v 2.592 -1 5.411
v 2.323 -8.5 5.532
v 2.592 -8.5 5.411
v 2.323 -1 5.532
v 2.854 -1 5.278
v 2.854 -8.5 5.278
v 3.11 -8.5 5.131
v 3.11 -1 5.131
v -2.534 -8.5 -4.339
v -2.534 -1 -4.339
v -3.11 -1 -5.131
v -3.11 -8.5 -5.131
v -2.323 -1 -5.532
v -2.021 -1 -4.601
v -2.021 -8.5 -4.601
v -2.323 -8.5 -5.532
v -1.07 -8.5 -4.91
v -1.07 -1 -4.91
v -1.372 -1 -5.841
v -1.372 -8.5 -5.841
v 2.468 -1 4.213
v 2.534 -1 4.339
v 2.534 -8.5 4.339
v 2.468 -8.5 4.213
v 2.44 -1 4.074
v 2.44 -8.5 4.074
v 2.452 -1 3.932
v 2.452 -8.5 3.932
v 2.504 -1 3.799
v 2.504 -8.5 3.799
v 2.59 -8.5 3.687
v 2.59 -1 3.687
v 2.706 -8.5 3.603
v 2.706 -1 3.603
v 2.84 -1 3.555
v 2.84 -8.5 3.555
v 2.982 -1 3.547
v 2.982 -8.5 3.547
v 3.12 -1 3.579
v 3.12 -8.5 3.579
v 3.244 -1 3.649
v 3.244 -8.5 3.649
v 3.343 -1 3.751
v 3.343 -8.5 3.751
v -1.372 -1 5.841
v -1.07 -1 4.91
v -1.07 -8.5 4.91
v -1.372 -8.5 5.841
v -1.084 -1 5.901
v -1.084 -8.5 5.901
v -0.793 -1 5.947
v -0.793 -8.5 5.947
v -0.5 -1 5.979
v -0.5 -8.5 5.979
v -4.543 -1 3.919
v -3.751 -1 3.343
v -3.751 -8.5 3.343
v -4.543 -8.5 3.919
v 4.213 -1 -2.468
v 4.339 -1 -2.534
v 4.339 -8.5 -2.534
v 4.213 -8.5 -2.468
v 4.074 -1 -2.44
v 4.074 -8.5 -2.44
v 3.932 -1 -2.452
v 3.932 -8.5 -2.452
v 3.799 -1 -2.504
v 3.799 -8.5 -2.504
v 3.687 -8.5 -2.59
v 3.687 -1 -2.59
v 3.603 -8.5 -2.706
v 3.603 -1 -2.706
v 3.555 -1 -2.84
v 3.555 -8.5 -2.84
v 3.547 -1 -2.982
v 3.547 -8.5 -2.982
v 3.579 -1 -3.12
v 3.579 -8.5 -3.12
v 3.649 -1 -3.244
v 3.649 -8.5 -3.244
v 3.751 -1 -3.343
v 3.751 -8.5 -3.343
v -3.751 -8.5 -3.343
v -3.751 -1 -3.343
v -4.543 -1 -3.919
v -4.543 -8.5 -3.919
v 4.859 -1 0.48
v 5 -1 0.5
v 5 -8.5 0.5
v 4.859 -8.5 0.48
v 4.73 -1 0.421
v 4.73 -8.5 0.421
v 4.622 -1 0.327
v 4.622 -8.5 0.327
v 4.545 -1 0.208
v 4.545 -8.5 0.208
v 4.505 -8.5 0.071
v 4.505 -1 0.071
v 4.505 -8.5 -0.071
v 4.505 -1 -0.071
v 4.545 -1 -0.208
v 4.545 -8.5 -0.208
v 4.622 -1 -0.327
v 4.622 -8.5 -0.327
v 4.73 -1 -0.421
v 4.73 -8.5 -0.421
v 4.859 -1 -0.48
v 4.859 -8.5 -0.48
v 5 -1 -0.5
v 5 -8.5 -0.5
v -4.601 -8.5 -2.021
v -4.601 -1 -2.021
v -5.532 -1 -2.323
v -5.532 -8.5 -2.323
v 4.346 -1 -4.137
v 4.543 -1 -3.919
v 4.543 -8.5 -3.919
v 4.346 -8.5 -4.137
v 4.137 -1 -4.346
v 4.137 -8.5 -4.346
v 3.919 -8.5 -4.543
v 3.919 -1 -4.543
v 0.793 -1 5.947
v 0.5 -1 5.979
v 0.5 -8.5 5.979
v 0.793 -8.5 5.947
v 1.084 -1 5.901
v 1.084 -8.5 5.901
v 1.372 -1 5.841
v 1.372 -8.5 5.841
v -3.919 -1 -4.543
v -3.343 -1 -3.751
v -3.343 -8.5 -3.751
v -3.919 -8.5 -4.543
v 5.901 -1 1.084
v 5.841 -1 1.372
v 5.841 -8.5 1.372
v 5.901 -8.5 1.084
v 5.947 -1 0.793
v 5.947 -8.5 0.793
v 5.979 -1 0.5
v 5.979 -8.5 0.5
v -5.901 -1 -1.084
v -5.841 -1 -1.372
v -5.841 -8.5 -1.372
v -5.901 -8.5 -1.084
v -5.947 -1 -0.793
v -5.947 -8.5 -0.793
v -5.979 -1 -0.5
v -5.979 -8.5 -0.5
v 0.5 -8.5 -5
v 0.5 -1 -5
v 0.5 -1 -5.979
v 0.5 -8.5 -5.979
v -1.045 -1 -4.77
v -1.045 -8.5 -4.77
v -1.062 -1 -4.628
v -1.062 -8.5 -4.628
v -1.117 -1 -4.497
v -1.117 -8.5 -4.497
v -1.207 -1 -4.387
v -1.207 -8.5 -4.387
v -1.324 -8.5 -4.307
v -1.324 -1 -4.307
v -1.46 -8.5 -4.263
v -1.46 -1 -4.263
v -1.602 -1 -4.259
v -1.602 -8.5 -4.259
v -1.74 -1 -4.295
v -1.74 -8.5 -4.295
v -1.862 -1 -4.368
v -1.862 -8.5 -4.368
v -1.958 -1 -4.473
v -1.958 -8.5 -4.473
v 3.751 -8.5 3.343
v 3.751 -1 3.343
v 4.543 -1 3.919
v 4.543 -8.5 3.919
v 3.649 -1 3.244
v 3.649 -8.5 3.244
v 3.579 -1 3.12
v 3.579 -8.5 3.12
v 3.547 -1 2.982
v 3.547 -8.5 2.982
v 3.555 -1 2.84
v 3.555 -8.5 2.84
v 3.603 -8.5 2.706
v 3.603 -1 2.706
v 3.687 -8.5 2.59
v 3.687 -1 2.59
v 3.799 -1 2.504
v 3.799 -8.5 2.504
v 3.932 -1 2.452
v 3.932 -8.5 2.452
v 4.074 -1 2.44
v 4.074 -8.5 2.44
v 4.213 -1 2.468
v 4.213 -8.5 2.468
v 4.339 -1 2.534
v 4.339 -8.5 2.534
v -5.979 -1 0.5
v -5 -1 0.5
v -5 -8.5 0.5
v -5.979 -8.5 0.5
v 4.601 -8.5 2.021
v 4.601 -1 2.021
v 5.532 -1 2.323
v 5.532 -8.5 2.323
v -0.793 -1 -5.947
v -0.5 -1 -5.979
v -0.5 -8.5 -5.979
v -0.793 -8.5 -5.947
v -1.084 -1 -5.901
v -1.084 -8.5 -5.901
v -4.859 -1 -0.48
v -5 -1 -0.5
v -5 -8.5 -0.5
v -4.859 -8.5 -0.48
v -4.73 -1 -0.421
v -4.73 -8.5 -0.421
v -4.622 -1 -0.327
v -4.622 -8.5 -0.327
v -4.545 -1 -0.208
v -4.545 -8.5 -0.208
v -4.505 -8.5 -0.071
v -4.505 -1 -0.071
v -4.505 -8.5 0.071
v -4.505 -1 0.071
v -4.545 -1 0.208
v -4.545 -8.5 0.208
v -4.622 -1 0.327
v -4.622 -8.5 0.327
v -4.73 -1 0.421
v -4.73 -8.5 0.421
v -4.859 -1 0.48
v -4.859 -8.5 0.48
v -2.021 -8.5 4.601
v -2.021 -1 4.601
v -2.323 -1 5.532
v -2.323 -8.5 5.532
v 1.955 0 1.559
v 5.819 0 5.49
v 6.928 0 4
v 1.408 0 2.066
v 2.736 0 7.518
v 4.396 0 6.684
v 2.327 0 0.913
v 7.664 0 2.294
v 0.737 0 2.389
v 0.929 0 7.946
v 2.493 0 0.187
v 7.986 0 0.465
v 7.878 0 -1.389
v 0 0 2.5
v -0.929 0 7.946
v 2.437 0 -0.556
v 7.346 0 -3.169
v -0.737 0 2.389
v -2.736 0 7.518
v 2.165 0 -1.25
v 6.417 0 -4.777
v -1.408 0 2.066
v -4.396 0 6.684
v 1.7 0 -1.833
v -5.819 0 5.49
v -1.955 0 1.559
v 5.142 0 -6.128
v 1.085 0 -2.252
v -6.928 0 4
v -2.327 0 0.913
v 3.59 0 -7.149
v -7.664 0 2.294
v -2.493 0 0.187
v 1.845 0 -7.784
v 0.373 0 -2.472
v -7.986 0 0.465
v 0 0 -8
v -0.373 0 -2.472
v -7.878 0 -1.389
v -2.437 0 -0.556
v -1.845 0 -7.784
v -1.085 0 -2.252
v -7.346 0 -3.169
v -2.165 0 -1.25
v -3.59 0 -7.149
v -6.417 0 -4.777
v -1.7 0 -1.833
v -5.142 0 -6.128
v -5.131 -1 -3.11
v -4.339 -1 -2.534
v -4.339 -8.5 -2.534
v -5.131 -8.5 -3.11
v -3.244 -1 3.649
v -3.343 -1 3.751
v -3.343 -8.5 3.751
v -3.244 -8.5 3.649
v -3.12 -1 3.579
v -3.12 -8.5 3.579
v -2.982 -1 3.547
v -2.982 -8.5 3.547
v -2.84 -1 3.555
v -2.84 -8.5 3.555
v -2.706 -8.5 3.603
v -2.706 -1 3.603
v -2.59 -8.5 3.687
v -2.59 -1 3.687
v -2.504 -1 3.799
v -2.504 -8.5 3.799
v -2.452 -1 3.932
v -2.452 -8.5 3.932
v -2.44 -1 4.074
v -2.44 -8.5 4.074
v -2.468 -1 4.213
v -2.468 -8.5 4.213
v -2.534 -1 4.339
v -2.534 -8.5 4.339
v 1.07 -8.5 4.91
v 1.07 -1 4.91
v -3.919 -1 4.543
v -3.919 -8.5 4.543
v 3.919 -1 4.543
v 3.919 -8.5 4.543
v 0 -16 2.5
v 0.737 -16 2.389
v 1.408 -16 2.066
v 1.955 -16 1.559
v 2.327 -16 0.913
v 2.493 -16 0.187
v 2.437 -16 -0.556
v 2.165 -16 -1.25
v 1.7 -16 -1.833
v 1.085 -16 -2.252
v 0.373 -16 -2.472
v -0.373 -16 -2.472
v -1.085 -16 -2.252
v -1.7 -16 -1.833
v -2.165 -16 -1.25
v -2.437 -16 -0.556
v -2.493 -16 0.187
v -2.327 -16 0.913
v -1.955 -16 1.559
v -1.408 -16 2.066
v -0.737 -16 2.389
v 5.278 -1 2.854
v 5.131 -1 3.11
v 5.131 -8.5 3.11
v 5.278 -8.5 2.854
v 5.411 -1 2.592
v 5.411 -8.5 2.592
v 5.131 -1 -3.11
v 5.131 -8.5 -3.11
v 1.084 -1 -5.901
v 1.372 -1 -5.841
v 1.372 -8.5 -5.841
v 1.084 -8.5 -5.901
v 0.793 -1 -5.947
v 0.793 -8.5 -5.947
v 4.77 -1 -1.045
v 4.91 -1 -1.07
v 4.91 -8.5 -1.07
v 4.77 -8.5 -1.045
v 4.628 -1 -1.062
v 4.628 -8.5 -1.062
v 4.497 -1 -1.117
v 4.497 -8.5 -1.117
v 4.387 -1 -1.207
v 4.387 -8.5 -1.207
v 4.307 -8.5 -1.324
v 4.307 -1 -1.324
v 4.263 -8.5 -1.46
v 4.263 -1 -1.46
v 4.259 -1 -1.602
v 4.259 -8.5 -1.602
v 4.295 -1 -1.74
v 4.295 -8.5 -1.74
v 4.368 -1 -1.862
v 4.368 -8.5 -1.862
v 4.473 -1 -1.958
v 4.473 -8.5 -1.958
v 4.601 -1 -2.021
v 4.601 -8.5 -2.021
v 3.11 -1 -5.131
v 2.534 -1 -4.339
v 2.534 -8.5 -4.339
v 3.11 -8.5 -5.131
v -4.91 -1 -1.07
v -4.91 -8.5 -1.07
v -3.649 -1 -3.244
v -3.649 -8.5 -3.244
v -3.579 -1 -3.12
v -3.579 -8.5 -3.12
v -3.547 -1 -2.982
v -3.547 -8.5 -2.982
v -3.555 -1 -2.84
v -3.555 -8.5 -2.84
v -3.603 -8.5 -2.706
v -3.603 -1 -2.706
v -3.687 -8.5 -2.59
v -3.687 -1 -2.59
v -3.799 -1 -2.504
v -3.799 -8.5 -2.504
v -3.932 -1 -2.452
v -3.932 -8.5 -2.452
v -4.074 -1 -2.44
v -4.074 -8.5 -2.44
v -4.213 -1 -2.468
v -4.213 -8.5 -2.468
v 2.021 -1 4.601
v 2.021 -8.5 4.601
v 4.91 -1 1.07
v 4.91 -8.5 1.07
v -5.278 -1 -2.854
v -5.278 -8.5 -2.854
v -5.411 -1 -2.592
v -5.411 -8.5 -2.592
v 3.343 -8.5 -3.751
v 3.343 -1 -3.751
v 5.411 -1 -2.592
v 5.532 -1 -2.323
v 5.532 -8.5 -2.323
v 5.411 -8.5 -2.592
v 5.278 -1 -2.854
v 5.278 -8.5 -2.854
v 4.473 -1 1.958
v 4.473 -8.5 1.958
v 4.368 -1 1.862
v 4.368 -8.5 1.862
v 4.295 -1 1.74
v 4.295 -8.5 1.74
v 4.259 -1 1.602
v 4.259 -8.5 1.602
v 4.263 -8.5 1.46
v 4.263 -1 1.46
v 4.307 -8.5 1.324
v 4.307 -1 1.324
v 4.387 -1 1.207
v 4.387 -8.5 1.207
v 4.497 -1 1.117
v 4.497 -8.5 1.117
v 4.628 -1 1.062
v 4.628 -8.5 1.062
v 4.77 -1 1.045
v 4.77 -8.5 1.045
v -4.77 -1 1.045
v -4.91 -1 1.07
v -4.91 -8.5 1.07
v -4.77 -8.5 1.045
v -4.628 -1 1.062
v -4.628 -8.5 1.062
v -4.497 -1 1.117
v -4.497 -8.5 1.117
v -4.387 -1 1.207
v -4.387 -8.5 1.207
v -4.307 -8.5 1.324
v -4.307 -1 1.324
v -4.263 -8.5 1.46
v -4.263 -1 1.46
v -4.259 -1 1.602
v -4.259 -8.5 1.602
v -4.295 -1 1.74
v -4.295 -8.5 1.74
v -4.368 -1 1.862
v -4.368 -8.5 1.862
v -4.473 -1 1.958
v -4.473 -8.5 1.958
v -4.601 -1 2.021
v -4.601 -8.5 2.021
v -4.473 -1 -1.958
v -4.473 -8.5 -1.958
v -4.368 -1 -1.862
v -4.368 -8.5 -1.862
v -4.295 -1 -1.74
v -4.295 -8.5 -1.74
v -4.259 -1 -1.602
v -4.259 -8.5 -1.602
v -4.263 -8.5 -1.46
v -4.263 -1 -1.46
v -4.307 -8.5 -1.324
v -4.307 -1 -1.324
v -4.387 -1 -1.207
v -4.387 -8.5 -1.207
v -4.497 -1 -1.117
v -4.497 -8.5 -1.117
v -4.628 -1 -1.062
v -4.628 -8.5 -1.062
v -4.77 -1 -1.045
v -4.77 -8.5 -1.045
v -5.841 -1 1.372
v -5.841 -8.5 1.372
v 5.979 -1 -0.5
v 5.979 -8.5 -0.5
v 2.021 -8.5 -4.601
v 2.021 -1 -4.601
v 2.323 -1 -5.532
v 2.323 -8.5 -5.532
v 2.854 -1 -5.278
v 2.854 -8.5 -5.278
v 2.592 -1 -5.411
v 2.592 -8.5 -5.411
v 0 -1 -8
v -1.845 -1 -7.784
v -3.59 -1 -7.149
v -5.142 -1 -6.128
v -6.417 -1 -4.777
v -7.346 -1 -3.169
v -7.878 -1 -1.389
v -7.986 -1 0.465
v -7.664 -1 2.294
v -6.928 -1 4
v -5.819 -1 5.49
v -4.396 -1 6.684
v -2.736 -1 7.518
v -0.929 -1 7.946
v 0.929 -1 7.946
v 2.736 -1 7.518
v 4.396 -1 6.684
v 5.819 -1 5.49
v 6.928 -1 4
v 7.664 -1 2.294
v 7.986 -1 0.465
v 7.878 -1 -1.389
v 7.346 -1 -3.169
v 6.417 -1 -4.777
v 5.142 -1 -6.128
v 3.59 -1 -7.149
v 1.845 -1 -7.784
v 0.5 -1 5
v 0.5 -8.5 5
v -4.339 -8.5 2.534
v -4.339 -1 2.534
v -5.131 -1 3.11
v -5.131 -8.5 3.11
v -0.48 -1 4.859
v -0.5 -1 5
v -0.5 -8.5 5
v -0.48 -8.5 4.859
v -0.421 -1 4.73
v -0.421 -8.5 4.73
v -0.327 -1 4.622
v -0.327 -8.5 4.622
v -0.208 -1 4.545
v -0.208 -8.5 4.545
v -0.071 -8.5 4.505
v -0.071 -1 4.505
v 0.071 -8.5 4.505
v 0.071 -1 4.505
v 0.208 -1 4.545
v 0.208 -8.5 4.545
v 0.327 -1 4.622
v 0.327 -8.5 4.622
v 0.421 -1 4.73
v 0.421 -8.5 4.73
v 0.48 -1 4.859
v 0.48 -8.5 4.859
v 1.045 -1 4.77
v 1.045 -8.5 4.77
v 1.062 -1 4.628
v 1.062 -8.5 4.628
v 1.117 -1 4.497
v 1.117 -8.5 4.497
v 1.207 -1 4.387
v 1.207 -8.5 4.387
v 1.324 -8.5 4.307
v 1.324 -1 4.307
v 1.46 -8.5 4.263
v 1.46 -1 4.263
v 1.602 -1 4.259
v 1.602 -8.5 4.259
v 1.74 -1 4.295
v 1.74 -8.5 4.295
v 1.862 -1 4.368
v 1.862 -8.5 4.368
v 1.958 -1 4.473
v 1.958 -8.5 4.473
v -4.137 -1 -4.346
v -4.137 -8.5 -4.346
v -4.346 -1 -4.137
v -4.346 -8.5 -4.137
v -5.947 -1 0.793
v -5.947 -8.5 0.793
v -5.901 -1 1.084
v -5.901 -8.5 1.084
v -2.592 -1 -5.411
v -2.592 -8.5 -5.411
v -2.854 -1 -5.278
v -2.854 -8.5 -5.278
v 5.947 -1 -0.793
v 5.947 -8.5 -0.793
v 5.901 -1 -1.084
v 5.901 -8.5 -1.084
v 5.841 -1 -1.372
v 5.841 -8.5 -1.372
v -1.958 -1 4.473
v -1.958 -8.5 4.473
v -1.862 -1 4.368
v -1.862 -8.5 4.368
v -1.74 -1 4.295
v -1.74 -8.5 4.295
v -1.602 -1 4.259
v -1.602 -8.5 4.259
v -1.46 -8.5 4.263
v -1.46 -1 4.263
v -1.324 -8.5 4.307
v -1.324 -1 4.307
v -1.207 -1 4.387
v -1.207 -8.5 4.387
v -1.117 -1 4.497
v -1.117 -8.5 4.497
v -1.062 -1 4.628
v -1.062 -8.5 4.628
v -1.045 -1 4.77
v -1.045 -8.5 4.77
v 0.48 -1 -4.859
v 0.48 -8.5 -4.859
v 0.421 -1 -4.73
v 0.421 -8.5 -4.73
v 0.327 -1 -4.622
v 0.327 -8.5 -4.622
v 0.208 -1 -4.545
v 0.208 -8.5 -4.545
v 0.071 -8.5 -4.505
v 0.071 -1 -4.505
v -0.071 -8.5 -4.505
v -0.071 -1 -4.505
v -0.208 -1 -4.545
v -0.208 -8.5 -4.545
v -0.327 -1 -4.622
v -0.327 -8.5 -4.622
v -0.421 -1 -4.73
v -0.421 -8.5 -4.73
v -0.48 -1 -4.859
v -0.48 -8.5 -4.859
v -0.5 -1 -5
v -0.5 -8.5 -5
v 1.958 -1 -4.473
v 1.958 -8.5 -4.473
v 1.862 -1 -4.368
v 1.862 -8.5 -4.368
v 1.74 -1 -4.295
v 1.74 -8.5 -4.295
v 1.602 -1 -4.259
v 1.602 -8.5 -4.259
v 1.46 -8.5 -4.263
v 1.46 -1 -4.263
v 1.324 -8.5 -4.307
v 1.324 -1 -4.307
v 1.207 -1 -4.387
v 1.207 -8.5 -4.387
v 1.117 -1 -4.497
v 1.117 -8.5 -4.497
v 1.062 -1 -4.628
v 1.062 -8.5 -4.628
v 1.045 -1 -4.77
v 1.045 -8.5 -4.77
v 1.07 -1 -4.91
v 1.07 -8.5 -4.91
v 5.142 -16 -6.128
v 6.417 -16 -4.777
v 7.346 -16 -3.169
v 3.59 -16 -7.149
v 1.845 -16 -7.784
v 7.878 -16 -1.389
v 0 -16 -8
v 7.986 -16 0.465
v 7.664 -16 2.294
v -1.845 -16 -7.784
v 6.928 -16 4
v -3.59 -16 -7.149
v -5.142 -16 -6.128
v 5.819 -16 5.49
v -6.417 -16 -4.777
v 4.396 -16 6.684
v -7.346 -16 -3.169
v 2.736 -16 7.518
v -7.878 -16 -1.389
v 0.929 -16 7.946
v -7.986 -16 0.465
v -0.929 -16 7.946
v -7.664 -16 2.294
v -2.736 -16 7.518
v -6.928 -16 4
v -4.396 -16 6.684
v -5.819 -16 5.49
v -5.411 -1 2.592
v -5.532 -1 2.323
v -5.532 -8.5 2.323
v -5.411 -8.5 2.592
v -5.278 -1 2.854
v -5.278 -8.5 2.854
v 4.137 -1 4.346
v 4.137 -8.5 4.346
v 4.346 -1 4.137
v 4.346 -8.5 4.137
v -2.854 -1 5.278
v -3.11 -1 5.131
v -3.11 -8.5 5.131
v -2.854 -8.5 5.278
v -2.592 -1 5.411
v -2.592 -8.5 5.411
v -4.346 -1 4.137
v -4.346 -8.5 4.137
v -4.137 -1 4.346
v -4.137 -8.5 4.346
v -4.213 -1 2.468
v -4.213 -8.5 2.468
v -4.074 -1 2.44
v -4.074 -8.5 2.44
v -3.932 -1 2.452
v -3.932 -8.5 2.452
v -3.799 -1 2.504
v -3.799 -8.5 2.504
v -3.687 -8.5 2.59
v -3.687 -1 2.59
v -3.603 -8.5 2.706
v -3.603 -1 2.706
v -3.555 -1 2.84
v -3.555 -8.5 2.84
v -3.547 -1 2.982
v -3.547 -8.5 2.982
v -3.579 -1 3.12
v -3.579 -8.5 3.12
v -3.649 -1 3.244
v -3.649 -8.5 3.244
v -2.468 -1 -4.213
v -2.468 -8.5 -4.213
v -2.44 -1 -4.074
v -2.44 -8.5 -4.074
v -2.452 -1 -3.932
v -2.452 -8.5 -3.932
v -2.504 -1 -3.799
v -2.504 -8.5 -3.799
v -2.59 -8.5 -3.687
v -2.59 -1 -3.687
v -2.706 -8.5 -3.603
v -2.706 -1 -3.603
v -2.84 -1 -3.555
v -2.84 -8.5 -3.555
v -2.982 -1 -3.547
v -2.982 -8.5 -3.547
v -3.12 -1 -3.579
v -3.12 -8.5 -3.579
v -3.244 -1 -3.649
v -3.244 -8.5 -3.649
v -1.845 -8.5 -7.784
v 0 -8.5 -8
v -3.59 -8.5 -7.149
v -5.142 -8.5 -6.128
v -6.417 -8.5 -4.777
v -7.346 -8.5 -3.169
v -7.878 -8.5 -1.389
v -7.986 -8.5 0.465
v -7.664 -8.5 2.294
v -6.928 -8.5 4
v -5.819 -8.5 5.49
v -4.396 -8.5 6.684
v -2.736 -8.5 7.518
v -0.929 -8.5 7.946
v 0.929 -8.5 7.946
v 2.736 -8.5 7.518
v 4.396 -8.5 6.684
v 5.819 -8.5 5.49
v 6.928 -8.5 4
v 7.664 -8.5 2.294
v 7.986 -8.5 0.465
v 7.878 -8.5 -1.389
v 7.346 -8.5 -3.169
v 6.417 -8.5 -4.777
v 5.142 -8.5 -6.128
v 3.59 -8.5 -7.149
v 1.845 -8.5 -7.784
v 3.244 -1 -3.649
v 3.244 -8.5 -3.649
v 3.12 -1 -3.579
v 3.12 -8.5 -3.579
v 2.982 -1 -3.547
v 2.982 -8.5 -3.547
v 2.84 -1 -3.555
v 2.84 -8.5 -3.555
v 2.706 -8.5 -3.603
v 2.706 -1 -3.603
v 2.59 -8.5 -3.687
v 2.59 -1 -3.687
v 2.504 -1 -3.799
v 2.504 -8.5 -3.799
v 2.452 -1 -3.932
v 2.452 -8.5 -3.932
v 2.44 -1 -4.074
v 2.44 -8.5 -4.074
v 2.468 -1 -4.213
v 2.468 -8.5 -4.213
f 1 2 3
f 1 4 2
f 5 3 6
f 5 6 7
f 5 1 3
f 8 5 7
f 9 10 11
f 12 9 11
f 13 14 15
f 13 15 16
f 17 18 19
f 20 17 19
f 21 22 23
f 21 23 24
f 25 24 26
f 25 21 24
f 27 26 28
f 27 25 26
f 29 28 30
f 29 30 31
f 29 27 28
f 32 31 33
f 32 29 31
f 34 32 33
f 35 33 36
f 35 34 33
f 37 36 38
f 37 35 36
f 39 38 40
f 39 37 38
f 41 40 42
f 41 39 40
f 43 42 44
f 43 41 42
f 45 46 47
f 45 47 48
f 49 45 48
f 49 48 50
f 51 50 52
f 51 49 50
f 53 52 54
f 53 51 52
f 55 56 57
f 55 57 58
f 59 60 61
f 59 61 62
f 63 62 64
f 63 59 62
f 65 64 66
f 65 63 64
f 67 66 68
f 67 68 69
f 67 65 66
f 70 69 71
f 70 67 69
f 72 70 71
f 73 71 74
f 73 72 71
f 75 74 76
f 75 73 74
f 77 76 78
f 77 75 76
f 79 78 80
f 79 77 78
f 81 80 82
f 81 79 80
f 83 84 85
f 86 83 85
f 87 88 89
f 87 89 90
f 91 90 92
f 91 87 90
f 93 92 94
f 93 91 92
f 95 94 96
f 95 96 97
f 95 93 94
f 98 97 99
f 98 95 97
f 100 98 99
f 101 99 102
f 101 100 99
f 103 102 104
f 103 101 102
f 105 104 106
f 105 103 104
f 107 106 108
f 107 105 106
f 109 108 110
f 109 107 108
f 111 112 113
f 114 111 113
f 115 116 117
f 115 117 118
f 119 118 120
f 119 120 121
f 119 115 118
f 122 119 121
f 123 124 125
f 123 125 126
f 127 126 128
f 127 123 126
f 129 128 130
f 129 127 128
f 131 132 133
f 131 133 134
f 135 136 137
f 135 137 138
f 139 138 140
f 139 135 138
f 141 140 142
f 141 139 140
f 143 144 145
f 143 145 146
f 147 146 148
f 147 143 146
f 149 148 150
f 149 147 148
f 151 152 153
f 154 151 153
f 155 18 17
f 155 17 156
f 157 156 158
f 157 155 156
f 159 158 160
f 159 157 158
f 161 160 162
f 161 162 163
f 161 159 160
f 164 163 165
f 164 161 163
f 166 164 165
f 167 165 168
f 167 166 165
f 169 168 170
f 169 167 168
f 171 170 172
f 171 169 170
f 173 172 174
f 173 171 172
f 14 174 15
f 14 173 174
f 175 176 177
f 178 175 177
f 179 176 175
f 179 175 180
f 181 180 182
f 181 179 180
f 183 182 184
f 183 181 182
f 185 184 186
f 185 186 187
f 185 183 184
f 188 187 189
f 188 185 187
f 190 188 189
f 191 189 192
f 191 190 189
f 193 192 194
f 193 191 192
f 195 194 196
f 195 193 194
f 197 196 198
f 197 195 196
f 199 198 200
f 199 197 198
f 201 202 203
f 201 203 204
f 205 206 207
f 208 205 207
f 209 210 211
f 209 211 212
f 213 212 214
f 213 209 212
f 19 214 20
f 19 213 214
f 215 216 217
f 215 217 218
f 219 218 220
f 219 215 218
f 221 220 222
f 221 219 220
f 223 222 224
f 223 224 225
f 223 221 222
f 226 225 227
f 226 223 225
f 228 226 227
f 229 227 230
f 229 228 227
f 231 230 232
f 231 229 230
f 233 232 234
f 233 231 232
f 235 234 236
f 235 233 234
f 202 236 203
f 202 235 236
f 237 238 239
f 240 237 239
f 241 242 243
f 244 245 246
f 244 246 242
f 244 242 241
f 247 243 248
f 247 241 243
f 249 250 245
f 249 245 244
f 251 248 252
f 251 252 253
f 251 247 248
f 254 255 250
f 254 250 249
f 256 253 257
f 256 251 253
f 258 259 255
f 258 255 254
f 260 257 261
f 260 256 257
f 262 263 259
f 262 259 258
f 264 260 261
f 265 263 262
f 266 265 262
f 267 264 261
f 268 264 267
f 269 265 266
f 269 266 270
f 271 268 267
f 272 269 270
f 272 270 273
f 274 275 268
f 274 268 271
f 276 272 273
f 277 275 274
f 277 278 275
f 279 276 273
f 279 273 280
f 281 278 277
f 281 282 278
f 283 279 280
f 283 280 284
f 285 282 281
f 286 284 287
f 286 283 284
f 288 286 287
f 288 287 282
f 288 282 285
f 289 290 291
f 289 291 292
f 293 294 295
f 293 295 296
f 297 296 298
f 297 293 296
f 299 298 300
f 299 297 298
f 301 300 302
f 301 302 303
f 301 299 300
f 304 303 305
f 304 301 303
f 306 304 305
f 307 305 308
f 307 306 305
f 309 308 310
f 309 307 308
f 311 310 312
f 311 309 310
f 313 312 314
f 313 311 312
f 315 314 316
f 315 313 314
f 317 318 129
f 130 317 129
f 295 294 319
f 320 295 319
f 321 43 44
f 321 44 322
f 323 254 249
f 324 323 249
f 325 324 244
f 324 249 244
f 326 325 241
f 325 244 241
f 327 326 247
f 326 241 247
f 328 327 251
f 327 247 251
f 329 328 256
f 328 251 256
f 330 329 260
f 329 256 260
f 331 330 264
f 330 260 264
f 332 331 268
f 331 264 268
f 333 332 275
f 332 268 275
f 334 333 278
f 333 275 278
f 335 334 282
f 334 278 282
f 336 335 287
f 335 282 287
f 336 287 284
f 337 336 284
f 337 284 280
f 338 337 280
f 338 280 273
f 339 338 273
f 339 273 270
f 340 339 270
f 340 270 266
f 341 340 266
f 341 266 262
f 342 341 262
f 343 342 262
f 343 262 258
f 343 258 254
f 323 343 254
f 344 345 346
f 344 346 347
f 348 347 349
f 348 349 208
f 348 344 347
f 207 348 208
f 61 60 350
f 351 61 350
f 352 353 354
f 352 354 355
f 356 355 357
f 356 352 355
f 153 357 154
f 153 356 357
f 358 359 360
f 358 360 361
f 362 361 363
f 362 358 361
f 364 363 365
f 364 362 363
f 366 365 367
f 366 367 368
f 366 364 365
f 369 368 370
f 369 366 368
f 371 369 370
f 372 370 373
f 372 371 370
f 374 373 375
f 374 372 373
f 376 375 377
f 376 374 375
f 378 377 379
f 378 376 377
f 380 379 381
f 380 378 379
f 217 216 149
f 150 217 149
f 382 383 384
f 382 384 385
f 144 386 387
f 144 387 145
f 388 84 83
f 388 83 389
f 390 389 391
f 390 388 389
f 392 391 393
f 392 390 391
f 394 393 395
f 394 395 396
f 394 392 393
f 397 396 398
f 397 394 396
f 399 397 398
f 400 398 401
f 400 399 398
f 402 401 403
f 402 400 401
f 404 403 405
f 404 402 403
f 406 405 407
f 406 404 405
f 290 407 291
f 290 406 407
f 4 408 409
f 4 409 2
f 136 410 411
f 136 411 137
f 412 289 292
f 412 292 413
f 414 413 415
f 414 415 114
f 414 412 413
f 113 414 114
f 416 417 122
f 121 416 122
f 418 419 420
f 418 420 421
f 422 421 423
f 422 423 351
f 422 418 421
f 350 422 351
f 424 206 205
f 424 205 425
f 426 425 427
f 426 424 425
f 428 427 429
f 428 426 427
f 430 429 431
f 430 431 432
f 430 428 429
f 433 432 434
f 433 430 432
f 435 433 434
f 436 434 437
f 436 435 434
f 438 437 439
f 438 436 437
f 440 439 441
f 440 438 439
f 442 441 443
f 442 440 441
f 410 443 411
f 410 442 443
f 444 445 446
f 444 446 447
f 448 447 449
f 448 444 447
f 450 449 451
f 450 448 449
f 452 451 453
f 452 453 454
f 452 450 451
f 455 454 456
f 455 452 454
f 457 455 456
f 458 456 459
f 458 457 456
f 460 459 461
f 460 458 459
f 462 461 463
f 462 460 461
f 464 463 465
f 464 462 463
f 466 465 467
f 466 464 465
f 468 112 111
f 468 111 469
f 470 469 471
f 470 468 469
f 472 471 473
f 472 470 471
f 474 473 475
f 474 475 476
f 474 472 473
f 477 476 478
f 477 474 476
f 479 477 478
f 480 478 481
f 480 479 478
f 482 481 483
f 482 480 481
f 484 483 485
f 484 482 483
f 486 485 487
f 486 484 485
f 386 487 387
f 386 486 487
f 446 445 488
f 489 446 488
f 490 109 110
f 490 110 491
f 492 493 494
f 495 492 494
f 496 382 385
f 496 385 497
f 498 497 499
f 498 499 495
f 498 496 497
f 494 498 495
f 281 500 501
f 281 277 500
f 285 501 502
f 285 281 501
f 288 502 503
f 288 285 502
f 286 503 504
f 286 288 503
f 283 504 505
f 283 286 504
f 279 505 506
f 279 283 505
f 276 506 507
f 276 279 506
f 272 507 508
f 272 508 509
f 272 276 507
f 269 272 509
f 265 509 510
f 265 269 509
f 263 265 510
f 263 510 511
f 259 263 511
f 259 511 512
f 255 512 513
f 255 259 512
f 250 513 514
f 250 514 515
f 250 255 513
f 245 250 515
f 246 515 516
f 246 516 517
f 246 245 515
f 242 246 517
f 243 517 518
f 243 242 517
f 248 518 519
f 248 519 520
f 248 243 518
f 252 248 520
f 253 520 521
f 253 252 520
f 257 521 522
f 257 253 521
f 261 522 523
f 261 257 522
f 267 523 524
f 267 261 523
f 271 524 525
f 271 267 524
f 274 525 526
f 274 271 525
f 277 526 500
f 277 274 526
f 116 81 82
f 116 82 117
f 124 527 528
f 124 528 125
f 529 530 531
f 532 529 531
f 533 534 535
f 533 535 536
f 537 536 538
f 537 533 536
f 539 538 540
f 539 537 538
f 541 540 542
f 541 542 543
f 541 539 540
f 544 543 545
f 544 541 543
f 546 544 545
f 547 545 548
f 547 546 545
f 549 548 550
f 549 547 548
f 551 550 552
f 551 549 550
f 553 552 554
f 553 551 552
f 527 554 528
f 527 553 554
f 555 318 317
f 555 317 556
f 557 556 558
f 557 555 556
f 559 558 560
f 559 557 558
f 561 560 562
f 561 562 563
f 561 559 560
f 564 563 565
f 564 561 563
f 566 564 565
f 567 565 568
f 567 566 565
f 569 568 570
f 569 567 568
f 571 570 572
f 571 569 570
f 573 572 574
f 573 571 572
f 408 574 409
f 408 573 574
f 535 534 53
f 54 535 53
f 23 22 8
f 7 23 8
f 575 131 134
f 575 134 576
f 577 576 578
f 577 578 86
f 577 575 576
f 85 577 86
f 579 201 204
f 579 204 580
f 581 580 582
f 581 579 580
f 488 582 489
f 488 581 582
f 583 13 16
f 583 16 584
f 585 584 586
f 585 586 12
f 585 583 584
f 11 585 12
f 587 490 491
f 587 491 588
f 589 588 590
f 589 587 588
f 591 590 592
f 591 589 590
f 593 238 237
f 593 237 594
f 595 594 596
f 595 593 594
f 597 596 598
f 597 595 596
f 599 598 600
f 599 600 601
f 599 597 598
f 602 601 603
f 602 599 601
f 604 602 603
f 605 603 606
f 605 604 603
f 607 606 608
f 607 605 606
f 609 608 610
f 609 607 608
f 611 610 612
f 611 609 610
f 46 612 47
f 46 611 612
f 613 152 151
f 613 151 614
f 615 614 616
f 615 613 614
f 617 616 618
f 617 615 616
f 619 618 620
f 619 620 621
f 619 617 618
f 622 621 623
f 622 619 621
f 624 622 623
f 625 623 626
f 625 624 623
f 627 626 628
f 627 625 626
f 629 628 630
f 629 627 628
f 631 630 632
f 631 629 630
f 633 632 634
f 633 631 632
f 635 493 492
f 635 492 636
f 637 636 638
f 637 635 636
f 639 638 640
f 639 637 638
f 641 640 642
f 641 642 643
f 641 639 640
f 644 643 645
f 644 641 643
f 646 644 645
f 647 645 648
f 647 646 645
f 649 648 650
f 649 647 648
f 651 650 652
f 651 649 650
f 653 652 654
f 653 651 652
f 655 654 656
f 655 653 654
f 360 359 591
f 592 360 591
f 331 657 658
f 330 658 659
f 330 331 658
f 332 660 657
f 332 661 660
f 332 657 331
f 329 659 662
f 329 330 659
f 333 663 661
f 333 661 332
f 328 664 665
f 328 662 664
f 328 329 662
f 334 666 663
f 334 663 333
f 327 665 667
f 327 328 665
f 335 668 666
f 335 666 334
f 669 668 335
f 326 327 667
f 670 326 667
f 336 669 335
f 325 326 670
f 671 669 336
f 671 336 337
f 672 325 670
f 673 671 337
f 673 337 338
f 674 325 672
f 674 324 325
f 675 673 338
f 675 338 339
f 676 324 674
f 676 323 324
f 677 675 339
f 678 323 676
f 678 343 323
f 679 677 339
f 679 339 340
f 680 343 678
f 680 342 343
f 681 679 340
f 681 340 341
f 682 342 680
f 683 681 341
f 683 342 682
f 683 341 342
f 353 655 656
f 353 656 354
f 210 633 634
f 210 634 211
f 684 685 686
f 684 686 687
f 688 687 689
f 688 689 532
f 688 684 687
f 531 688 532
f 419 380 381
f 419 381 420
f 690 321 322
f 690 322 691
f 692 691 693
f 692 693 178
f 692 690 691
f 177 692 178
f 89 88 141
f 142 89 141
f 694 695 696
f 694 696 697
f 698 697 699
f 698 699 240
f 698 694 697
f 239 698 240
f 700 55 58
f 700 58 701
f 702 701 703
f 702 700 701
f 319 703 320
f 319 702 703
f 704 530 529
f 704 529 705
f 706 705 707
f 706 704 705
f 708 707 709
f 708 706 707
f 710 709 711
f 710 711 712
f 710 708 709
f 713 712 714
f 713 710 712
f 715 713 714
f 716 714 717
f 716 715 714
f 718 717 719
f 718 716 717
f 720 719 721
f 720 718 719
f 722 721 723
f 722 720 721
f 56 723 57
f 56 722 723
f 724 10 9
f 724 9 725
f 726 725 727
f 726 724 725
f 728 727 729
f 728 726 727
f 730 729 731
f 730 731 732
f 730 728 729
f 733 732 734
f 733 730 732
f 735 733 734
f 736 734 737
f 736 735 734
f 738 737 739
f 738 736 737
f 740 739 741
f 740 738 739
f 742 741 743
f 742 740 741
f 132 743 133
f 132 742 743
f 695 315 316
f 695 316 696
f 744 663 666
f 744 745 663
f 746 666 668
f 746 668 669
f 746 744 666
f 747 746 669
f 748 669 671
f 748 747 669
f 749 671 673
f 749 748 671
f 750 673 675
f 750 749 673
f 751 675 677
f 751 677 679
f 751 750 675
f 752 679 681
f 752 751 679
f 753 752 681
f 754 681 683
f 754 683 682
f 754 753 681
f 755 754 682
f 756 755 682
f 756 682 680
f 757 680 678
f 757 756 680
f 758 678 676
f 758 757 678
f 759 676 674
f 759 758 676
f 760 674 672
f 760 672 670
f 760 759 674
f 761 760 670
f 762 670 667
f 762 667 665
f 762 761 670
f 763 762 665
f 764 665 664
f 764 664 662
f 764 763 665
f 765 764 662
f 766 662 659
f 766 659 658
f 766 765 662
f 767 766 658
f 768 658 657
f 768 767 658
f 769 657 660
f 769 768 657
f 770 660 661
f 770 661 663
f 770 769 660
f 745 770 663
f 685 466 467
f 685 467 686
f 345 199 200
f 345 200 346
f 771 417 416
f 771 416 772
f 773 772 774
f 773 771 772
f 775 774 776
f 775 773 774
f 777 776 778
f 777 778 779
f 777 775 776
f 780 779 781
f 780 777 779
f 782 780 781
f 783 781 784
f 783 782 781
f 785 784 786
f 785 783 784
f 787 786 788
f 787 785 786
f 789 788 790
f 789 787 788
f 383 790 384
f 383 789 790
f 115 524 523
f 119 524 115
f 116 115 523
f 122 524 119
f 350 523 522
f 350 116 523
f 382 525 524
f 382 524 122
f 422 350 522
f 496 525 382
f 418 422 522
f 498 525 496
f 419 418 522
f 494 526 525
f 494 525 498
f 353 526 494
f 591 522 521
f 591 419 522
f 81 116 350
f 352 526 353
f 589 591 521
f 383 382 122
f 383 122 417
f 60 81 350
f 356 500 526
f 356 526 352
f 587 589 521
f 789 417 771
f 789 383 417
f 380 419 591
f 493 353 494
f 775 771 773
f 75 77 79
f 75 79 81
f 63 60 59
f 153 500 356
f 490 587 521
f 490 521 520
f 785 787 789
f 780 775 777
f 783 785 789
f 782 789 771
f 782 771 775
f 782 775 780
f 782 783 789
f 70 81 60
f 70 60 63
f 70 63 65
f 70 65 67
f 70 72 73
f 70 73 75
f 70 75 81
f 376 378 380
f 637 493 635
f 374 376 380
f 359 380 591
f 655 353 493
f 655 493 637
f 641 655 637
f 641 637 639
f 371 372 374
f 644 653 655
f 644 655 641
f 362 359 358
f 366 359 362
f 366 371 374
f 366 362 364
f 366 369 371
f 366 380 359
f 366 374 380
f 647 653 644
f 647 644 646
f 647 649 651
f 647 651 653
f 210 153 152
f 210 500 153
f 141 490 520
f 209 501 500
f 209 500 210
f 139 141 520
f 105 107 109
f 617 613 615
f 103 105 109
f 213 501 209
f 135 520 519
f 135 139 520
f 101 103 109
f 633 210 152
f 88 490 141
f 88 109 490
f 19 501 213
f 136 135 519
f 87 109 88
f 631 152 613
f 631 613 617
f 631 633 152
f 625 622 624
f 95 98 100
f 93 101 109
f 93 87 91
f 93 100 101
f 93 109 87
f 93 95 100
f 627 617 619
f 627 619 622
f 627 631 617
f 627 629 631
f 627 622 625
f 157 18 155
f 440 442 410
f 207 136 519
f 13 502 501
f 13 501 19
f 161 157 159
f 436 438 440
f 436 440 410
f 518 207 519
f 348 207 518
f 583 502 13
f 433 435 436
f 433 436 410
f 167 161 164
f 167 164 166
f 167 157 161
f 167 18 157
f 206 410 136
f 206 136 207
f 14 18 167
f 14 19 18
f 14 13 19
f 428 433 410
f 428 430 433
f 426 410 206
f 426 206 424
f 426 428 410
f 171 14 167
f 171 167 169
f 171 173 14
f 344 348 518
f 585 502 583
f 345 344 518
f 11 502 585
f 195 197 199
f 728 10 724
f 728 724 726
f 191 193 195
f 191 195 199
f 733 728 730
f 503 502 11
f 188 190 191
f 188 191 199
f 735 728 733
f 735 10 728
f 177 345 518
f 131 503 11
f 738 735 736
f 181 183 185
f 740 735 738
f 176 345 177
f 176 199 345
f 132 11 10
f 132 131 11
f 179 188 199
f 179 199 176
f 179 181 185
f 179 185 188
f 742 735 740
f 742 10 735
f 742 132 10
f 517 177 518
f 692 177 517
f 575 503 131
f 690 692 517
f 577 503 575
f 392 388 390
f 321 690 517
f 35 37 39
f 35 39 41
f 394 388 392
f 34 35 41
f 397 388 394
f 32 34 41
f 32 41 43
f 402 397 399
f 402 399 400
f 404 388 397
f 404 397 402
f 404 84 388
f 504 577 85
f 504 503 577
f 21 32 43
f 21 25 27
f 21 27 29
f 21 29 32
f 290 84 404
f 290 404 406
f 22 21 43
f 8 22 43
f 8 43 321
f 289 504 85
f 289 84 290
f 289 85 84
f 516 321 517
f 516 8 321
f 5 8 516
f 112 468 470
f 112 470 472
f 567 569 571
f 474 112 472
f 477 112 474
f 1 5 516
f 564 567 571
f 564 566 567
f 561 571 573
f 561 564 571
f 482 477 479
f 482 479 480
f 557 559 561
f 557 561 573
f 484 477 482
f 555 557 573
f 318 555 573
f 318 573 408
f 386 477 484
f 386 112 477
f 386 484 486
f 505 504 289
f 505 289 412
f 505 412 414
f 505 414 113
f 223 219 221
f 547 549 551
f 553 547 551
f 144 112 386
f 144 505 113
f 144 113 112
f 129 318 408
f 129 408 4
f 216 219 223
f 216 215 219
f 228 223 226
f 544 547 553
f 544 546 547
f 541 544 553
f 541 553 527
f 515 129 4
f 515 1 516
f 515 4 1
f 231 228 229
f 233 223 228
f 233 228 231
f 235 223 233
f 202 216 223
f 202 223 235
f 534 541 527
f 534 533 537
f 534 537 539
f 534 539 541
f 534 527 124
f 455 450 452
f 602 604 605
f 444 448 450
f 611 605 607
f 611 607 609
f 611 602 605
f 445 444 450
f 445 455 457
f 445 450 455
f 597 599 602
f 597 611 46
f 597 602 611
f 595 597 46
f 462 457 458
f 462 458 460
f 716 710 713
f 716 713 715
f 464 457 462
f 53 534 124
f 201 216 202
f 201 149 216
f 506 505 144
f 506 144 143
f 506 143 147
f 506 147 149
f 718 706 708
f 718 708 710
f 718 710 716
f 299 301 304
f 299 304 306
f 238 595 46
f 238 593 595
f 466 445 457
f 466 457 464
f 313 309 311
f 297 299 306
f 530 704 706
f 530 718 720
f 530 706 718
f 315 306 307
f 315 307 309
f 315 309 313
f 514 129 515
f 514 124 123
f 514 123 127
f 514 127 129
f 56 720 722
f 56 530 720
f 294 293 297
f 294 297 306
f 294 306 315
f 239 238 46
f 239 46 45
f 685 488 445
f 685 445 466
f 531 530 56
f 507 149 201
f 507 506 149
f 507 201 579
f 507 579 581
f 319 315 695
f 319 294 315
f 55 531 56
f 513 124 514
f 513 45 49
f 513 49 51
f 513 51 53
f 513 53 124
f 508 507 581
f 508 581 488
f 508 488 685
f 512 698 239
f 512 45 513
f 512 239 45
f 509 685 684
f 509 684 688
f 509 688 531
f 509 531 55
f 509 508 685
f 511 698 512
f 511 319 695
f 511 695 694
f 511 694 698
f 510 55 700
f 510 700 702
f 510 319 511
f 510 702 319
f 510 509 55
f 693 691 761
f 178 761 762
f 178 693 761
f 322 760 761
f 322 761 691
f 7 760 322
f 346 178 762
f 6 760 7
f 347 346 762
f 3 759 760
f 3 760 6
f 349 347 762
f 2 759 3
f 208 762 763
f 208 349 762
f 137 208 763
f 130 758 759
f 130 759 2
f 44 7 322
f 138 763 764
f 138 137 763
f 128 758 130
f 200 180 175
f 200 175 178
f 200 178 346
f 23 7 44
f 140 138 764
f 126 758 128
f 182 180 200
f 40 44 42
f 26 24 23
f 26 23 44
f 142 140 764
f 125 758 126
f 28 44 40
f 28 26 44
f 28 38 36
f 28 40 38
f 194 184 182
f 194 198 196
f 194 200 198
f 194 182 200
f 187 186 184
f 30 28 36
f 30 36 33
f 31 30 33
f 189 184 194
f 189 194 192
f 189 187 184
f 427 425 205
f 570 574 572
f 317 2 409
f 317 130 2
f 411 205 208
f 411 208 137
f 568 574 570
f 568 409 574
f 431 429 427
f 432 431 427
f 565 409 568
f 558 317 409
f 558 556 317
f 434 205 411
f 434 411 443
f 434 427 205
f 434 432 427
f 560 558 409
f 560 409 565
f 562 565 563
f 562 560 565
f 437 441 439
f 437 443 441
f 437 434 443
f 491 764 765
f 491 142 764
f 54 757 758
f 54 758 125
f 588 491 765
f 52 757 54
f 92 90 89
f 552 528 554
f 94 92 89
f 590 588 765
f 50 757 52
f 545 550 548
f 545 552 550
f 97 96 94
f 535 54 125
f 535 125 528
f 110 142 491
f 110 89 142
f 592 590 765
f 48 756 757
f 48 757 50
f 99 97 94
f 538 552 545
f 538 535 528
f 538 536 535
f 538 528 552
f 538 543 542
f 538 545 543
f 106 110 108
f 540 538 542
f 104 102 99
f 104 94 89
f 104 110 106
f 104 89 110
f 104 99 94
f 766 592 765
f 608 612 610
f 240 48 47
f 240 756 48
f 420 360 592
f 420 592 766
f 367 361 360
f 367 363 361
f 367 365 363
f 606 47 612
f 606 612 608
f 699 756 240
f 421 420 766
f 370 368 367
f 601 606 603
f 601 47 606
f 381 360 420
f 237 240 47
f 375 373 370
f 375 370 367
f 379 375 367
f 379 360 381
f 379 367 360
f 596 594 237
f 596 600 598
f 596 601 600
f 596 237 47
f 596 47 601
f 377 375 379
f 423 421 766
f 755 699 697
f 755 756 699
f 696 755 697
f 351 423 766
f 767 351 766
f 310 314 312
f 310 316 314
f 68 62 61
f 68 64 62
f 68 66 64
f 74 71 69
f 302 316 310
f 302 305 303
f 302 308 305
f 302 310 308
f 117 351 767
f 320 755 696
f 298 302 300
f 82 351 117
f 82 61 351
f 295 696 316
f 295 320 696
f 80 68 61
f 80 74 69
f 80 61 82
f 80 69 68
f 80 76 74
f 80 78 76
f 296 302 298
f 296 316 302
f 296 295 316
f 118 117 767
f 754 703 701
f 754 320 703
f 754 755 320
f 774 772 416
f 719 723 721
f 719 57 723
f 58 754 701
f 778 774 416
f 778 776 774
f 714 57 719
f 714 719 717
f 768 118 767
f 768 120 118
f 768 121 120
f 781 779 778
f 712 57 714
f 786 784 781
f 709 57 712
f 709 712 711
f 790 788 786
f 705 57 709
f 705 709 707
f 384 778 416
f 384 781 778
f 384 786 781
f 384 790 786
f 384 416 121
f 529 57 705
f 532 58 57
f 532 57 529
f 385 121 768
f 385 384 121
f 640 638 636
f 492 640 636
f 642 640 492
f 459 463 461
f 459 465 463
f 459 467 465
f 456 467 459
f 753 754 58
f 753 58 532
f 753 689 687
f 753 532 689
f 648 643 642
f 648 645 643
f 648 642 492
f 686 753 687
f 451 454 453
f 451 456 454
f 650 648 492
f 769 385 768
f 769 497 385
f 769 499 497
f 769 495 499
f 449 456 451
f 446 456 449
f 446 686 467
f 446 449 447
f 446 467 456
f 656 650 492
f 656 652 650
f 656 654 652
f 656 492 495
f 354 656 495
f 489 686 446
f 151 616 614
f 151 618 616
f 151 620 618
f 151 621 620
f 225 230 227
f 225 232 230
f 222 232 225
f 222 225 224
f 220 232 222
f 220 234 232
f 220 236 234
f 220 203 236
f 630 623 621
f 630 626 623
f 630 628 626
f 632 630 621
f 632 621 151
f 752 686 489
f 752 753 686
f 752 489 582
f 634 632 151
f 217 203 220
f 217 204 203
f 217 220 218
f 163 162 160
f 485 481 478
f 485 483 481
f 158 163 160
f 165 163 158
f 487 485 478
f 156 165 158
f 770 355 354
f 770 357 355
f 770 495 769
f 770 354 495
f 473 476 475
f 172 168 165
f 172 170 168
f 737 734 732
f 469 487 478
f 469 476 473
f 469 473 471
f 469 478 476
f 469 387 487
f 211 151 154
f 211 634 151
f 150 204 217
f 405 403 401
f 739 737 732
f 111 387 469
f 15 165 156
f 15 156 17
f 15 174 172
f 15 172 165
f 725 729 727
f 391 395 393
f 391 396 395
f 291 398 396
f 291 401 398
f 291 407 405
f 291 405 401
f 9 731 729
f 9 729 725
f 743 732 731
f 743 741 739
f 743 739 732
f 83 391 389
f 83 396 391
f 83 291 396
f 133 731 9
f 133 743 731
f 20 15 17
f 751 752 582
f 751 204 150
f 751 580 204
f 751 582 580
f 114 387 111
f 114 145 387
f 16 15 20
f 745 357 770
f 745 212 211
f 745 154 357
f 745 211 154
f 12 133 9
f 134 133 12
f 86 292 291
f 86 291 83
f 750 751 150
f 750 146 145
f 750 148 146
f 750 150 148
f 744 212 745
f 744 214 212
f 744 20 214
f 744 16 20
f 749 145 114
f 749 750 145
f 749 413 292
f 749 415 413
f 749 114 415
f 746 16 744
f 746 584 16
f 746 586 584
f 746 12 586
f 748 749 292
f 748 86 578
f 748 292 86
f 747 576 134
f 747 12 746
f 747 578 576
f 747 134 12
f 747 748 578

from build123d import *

# Parameters (mm, degrees)
SKETCH_2_R               = 0.5
SKETCH_2_W               = 1
SKETCH_2_H               = 4
CUT_EXTRUDE_1_DEPTH      = 7.5
PATTERN_CIRCULAR_1_COUNT = 20
SKETCH_3_R               = 2.5
CUT_EXTRUDE_2_DEPTH      = 20.595917942


with BuildPart() as part:
    # 草图1 → 旋转3 (revolve)
    with BuildSketch(Plane.XY, mode=Mode.PRIVATE) as revolve_3_sk:
        Polygon((-8, 0), (0, 0), (0, -16), (-8, -16), (-8, -8.5), (-6, -8.5), (-6, -1), (-8, -1), align=None)
    revolve(revolve_3_sk.sketch.rotate(Axis((0, 0, 0), (0, 1, 0)), 270), axis=Axis((0, 0, 0), (0, 1, 0)))

    # 草图2 → 切除-拉伸1 (cut)
    with BuildSketch(Plane.XZ.offset(1)):
        with Locations((0, 5)):
            Circle(SKETCH_2_R)
        with Locations((0, 7)):
            Rectangle(SKETCH_2_W, SKETCH_2_H)
    cut_extrude_1 = extrude(amount=CUT_EXTRUDE_1_DEPTH, mode=Mode.SUBTRACT)

    # 阵列(圆周)1: 切除-拉伸1 ×20 about axis
    pattern_circular_1_axis = Axis((0, 0, 0), (0, 1, 0))
    for i in range(1, PATTERN_CIRCULAR_1_COUNT):
        add(cut_extrude_1.rotate(pattern_circular_1_axis, i * 360 / PATTERN_CIRCULAR_1_COUNT), mode=Mode.SUBTRACT)

    # 草图3 → 切除-拉伸2 (cut, through all)
    with BuildSketch(Plane(origin=(0, 0, 0), x_dir=(1, 0, 0), z_dir=(0, 1, 0))):
        with Locations(Location((0, 0, 0), (0, 0, 270))):
            Circle(SKETCH_3_R)
    extrude(amount=-CUT_EXTRUDE_2_DEPTH, mode=Mode.SUBTRACT)


solid = part.part
